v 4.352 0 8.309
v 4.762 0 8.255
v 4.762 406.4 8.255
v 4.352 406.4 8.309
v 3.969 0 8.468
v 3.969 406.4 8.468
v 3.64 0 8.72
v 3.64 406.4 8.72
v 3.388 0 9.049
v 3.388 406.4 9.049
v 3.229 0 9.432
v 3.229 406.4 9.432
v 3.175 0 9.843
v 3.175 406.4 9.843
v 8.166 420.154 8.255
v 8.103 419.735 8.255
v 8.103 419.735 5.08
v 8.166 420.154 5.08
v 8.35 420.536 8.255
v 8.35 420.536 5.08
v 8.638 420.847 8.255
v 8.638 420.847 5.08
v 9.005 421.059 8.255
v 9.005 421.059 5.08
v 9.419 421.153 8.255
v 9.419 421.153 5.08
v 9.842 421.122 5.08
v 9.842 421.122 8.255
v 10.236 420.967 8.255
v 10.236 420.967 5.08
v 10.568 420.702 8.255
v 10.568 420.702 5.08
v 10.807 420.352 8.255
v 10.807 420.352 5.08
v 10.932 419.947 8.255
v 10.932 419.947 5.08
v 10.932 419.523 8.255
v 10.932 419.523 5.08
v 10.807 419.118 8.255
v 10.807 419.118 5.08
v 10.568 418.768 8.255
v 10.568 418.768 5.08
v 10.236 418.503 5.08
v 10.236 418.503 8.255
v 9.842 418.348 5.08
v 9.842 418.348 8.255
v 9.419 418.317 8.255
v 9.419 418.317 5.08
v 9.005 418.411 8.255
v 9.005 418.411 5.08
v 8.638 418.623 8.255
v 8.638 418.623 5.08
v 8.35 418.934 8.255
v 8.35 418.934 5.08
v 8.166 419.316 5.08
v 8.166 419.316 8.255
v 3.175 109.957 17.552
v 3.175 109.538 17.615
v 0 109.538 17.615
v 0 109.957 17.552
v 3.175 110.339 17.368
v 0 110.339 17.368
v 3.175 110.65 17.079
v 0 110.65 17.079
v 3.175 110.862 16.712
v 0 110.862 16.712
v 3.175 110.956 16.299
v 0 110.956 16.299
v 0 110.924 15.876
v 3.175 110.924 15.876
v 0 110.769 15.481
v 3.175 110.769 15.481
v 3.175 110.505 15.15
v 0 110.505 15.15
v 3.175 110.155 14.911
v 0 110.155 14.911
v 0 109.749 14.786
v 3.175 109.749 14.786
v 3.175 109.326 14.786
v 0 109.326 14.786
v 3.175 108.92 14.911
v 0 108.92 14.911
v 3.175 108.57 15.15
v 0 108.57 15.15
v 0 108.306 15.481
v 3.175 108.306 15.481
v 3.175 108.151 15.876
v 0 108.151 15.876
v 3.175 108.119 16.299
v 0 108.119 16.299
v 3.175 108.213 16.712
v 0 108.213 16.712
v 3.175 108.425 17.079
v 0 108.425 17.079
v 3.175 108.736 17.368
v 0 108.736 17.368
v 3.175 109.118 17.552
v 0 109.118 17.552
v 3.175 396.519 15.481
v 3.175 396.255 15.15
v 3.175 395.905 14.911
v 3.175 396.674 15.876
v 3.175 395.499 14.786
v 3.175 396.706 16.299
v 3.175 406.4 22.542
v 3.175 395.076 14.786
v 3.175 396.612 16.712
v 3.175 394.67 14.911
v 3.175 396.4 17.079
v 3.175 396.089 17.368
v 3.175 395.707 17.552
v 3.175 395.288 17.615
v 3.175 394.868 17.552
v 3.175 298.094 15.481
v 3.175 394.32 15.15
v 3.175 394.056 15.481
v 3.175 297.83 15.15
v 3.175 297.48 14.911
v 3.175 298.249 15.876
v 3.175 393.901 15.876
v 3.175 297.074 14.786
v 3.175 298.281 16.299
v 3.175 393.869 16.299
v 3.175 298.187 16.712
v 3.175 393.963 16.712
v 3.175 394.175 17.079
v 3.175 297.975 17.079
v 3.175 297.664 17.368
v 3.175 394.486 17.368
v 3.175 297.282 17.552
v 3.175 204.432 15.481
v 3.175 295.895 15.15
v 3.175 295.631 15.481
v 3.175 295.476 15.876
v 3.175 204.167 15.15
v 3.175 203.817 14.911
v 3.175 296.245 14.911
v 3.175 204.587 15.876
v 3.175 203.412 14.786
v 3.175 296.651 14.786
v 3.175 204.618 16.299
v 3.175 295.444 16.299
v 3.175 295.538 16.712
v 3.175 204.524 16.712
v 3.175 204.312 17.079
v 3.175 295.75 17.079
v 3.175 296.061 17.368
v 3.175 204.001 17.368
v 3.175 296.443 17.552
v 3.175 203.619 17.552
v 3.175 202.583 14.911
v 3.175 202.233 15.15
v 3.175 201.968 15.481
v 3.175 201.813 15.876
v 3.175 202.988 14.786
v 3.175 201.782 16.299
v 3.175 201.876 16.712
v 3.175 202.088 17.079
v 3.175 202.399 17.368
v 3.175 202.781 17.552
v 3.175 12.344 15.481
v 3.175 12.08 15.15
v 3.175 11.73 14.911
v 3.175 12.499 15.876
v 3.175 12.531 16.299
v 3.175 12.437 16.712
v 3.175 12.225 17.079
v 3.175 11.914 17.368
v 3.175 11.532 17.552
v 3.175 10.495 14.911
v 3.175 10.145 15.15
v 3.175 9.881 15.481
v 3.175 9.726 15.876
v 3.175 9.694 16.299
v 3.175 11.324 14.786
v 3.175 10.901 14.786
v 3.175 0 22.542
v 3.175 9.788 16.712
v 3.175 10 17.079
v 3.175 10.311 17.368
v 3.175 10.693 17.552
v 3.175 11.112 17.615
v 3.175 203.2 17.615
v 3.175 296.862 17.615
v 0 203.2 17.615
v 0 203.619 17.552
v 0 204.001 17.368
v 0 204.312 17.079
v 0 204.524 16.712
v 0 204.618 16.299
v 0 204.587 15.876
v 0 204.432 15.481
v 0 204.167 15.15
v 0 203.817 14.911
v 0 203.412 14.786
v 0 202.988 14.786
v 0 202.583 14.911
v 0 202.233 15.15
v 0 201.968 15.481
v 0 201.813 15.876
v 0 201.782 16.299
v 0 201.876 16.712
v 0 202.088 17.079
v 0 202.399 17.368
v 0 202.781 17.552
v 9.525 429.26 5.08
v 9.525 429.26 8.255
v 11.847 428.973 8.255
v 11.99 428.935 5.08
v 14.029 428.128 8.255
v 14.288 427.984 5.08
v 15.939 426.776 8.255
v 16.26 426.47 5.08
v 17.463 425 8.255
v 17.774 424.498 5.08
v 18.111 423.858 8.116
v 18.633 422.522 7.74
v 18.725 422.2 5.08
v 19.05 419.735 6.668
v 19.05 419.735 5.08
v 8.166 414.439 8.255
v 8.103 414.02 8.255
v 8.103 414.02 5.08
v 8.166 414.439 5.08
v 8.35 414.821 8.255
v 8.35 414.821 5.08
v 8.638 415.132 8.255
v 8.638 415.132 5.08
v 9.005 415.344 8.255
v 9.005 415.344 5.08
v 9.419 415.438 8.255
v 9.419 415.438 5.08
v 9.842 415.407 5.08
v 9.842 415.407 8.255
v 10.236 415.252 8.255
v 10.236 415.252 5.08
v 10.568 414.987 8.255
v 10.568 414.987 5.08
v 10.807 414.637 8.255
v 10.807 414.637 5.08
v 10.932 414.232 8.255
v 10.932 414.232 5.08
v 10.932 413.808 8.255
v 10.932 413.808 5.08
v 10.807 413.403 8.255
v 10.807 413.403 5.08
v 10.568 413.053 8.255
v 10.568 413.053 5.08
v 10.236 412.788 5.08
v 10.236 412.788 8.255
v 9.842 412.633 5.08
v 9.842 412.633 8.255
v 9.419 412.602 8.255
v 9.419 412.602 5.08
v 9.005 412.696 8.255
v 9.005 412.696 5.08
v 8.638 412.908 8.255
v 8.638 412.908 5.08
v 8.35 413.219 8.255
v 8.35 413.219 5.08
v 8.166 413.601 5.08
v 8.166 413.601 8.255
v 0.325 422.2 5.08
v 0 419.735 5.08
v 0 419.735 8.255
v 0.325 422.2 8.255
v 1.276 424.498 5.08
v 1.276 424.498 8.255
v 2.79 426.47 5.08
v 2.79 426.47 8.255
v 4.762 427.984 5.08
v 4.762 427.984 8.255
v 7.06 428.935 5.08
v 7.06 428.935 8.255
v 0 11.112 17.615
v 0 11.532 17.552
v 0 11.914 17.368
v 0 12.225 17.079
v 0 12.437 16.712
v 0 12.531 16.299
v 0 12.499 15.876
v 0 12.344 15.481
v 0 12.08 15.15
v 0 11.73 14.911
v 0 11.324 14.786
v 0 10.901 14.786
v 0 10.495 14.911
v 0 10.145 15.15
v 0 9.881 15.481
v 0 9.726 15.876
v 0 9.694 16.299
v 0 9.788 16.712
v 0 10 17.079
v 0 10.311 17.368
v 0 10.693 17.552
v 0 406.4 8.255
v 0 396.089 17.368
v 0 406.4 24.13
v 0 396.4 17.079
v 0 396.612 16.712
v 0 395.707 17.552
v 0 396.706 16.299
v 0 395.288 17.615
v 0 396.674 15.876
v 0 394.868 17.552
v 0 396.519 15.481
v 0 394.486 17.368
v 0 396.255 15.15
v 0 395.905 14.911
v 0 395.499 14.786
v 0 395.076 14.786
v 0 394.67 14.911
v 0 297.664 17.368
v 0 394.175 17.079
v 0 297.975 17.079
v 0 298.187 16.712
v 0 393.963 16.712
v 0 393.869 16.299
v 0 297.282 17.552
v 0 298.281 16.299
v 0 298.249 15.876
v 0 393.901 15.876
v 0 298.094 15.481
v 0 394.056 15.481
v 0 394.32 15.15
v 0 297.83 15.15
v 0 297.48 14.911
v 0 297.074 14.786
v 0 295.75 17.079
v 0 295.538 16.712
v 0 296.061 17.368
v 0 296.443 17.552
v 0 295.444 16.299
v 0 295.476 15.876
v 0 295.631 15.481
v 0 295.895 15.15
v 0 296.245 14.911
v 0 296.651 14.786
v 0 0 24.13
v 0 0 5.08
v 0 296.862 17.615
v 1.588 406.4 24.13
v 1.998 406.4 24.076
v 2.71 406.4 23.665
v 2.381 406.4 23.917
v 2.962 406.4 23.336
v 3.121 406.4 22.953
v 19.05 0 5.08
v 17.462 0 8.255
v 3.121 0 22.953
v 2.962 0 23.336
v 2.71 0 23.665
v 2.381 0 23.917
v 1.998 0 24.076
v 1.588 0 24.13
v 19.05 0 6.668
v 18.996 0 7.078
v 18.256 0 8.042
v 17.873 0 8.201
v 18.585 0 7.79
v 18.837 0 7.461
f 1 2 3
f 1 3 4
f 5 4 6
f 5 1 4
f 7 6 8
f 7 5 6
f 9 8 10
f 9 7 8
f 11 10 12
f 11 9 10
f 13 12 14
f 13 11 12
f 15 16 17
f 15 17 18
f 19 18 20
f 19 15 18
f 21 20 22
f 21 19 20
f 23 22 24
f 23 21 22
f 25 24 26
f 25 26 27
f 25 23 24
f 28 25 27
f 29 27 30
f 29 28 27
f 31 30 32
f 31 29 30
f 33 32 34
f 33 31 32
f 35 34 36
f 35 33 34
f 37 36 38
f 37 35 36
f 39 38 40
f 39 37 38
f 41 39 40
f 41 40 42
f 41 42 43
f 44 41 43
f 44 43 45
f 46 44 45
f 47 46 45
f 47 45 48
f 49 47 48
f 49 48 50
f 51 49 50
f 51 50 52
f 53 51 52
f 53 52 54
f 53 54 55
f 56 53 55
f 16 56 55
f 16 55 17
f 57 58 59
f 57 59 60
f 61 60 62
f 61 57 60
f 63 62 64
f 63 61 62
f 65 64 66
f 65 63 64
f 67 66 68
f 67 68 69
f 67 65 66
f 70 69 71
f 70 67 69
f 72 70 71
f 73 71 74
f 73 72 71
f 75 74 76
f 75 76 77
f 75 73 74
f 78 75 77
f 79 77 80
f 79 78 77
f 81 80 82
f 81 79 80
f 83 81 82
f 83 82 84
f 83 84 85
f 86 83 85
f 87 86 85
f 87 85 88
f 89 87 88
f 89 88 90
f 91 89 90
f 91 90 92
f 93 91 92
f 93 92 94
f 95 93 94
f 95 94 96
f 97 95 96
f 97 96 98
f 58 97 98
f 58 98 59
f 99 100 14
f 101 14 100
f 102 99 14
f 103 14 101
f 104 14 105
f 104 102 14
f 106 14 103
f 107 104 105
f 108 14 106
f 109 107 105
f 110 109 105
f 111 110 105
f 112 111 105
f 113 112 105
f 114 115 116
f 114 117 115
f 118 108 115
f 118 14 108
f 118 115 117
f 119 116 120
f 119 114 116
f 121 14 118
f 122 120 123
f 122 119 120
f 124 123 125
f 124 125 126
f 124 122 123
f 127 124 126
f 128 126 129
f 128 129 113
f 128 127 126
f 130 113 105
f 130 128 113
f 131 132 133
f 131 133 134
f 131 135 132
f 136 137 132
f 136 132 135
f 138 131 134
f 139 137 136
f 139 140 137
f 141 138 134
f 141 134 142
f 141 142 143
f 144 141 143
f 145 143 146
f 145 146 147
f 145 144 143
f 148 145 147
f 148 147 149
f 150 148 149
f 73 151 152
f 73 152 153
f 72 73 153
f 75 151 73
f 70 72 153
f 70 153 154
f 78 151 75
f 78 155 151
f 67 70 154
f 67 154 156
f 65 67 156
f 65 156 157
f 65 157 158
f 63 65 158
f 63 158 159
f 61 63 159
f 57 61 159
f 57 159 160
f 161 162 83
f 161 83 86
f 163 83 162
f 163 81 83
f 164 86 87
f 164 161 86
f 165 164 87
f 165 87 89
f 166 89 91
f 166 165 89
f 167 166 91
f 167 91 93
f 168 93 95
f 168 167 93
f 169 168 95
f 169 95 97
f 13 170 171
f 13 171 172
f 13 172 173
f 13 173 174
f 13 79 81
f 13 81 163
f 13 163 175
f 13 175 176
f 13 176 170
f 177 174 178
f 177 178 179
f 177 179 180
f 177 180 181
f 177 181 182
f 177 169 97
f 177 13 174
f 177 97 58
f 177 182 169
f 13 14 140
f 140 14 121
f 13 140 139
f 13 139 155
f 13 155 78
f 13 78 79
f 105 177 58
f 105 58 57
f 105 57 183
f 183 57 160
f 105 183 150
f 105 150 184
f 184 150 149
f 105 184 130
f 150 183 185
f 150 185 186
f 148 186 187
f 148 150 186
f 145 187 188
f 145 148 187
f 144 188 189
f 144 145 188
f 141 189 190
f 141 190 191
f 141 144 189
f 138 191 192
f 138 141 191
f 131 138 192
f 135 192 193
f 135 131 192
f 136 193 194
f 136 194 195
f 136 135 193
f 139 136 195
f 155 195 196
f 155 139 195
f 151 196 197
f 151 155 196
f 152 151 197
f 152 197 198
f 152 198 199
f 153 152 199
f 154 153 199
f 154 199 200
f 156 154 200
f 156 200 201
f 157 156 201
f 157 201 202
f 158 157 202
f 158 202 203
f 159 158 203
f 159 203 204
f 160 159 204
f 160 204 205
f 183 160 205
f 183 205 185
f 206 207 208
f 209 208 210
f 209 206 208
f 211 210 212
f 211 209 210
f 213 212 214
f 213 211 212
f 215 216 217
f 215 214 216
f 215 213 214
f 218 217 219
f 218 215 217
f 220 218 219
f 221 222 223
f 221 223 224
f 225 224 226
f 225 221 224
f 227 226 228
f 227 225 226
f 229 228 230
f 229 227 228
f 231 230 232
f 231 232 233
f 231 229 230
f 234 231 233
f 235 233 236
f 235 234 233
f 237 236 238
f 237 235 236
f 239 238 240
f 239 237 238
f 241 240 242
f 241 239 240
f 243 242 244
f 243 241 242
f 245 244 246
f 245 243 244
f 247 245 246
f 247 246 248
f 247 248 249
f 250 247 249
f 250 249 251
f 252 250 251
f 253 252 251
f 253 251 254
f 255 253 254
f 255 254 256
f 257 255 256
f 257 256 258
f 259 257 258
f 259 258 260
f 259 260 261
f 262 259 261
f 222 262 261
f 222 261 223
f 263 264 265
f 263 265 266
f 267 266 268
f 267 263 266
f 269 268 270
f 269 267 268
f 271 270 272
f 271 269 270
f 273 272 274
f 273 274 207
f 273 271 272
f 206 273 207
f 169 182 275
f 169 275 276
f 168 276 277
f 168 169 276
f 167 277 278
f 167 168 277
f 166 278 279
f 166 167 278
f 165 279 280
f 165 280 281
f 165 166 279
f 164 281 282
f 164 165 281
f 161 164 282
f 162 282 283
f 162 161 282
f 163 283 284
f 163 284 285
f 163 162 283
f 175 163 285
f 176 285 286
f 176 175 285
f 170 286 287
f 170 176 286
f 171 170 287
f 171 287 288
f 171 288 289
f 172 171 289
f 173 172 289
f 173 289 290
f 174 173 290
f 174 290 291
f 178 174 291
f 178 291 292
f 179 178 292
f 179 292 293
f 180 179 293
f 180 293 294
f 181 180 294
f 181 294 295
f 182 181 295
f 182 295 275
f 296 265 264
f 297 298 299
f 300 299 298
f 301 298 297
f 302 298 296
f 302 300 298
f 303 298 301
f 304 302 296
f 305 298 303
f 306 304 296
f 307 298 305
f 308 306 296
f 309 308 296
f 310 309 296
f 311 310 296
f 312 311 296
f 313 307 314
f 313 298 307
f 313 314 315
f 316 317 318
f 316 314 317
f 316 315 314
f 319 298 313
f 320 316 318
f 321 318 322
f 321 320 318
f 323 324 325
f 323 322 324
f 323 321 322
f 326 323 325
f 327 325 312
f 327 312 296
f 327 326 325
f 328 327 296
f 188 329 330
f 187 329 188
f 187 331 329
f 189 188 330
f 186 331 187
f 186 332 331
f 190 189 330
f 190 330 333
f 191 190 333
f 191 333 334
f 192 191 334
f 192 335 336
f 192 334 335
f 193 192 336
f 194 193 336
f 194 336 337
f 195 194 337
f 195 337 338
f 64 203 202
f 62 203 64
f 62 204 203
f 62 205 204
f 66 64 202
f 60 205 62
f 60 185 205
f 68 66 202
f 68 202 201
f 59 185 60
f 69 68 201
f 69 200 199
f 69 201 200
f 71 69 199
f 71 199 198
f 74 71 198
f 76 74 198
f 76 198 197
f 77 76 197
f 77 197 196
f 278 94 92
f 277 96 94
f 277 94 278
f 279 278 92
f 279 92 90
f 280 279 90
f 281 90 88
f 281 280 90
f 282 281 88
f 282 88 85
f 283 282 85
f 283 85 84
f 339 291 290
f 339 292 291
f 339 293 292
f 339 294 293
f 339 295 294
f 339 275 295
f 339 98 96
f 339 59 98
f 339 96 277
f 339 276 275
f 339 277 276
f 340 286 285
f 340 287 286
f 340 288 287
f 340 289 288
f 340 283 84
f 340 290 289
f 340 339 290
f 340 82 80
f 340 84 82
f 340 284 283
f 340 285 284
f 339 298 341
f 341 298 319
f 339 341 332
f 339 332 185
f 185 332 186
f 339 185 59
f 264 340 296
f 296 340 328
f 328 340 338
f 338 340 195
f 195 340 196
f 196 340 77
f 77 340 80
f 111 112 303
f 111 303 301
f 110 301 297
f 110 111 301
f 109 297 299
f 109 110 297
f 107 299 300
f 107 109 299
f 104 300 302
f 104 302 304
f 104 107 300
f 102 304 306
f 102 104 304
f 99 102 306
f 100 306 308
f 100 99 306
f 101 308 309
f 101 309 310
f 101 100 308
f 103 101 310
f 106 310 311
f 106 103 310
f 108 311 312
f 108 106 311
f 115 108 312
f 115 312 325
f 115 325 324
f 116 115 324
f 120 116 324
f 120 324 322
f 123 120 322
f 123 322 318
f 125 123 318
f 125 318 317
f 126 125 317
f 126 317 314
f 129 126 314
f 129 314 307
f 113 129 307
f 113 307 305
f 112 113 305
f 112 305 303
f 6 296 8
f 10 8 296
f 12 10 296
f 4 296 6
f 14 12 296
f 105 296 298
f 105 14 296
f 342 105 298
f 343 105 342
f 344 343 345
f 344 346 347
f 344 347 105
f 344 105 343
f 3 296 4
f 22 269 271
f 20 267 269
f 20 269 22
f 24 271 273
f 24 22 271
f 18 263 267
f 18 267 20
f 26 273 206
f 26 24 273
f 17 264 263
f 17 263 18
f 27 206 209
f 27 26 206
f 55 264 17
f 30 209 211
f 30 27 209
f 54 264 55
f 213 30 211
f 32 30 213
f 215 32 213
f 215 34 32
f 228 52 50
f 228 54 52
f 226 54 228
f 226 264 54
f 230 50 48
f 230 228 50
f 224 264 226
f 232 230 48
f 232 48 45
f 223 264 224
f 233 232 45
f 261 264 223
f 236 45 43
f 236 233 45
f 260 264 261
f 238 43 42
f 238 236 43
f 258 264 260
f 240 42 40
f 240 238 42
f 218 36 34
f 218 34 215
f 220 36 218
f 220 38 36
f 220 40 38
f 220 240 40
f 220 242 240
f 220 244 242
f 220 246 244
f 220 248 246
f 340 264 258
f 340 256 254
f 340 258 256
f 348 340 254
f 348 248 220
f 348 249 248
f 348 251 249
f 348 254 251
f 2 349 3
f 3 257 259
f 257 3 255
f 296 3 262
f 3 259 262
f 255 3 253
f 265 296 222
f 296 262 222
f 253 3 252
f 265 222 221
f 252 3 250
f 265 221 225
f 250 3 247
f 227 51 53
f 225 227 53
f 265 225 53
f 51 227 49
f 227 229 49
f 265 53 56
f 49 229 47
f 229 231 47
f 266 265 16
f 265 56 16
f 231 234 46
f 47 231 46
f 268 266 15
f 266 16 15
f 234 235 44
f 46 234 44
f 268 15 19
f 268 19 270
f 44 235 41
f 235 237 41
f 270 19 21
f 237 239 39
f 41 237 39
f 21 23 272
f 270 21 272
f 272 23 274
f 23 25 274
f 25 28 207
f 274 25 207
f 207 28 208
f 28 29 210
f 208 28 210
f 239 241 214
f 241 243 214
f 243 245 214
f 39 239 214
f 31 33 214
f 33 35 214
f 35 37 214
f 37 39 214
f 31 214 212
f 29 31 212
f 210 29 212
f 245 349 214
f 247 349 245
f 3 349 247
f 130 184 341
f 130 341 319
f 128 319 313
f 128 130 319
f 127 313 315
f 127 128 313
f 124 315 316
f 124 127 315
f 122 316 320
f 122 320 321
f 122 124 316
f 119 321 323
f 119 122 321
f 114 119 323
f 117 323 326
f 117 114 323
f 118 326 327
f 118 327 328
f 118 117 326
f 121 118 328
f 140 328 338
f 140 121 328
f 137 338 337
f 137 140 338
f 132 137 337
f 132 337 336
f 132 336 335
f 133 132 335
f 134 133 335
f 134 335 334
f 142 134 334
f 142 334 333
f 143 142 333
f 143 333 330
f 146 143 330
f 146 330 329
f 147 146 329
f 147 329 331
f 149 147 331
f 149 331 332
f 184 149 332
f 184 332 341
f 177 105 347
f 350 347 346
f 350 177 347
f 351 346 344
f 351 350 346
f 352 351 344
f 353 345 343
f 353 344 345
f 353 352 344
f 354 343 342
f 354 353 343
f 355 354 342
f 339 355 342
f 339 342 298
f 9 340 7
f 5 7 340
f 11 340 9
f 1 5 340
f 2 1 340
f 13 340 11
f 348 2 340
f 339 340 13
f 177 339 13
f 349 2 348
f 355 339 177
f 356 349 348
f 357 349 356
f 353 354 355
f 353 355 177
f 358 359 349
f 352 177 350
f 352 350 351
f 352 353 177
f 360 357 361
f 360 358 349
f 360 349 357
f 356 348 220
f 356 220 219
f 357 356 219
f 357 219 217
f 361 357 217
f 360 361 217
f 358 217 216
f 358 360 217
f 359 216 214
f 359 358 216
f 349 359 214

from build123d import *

# Parameters (mm, degrees)
BOSS_EXTRUDE1_DEPTH = 431.8
SKETCH4_W           = 15.875
SKETCH4_H           = 25.4
CUT_EXTRUDE1_DEPTH  = 6.35
SKETCH5_W           = 1.5875
SKETCH5_H           = 25.4
CUT_EXTRUDE2_DEPTH  = 6.35
SKETCH6_R           = 1.4224
CUT_EXTRUDE3_DEPTH  = 5.08
CUT_EXTRUDE4_START  = -2.54
CUT_EXTRUDE4_DEPTH  = 2.54
SKETCH8_R           = 1.4224
CUT_EXTRUDE5_DEPTH  = 5.08
SKETCH9_W           = 28.861002292
SKETCH9_H           = 547.524656259
CUT_EXTRUDE6_DEPTH  = 30.48
CUT_EXTRUDE7_DEPTH  = 5.08


with BuildPart() as part:
    # Sketch2 → Boss-Extrude1 (new body)
    with BuildSketch(Plane(origin=(0, 0, 0), x_dir=(1, 0, 0), z_dir=(0, 1, 0))):
        with BuildLine():
            Line((0, 0), (19.05, 0))
            Line((19.05, 0), (19.05, 1.5875))
            ThreePointArc((19.05, 1.5875), (18.585032015, 2.710032015), (17.4625, 3.175))
            Line((17.4625, 3.175), (4.7625, 3.175))
            ThreePointArc((4.7625, 3.175), (3.639967985, 3.639967985), (3.175, 4.7625))
            Line((3.175, 4.7625), (3.175, 17.4625))
            ThreePointArc((3.175, 17.4625), (2.710032015, 18.585032015), (1.5875, 19.05))
            Line((1.5875, 19.05), (0, 19.05))
            Line((0, 19.05), (0, 0))
        make_face()
    extrude(amount=BOSS_EXTRUDE1_DEPTH)

    # Sketch4 → Cut-Extrude1 (cut)
    with BuildSketch(Plane(origin=(3.175, 0, 0), x_dir=(0, 0, -1), z_dir=(1, 0, 0))):
        with Locations((11.1125, 419.1)):
            Rectangle(SKETCH4_W, SKETCH4_H)
    extrude(amount=-CUT_EXTRUDE1_DEPTH, mode=Mode.SUBTRACT)

    # Sketch5 → Cut-Extrude2 (cut)
    with BuildSketch(Plane.ZY.offset(-3.175)):
        with Locations((-3.96875, 419.1)):
            Rectangle(SKETCH5_W, SKETCH5_H)
    extrude(amount=-CUT_EXTRUDE2_DEPTH, mode=Mode.SUBTRACT)

    # Sketch6 → Cut-Extrude3 (cut)
    with BuildSketch(Plane(origin=(3.175, 0, 0), x_dir=(0, 0, -1), z_dir=(1, 0, 0))):
        with Locations((11.1125, 109.5375)):
            Circle(SKETCH6_R)
        with Locations((11.1125, 203.2)):
            Circle(SKETCH6_R)
        with Locations((11.1125, 296.8625)):
            Circle(SKETCH6_R)
        with Locations((11.1125, 11.1125)):
            Circle(SKETCH6_R)
        with Locations((11.1125, 395.2875)):
            Circle(SKETCH6_R)
    extrude(amount=-CUT_EXTRUDE3_DEPTH, mode=Mode.SUBTRACT)

    # Sketch7 → Cut-Extrude4 (cut)
    with BuildSketch(Plane(origin=(0, 431.8, 0), x_dir=(1, 0, 0), z_dir=(0, 1, 0)).offset(CUT_EXTRUDE4_START)):
        with BuildLine():
            Line((17.4625, 3.175), (0, 3.175))
            Line((0, 3.175), (0, 0))
            Line((0, 0), (19.05, 0))
            Line((19.05, 0), (19.05, 1.5875))
            ThreePointArc((19.05, 1.5875), (18.585032015, 2.710032015), (17.4625, 3.175))
        make_face()
    extrude(amount=CUT_EXTRUDE4_DEPTH, mode=Mode.SUBTRACT)

    # Sketch8 → Cut-Extrude5 (cut)
    with BuildSketch(Plane(origin=(0, 0, -3.175), x_dir=(-1, 0, 0), z_dir=(0, 0, -1))):
        with Locations((-9.525, 419.735)):
            Circle(SKETCH8_R)
        with Locations((-9.525, 414.02)):
            Circle(SKETCH8_R)
    extrude(amount=-CUT_EXTRUDE5_DEPTH, mode=Mode.SUBTRACT)


with BuildPart() as body_2:
    # Mirror3: mirrored copy
    add(part.part.mirror(Plane.XY.offset(2.54)))

    # Sketch10 → Cut-Extrude7 (cut)
    with BuildSketch(Plane.XY.offset(8.255)):
        with BuildLine():
            Line((19.05, 419.735), (19.05, 429.26))
            Line((19.05, 429.26), (9.525, 429.26))
            ThreePointArc((9.525, 429.26), (16.260192091, 426.470192091), (19.05, 419.735))
        make_face()
        with BuildLine():
            ThreePointArc((0, 419.735), (2.789807909, 426.470192091), (9.525, 429.26))
            Line((9.525, 429.26), (0, 429.26))
            Line((0, 429.26), (0, 419.735))
        make_face()
    extrude(amount=-CUT_EXTRUDE7_DEPTH, mode=Mode.SUBTRACT)


with BuildPart() as part_1:
    add(part.part)

    # Sketch9 → Cut-Extrude6 (cut)
    with BuildSketch(Plane.XY.offset(2.54)):
        with Locations((7.805746781, 195.778589833)):
            Rectangle(SKETCH9_W, SKETCH9_H)
    extrude(amount=-CUT_EXTRUDE6_DEPTH, mode=Mode.SUBTRACT)


solid = body_2.part
